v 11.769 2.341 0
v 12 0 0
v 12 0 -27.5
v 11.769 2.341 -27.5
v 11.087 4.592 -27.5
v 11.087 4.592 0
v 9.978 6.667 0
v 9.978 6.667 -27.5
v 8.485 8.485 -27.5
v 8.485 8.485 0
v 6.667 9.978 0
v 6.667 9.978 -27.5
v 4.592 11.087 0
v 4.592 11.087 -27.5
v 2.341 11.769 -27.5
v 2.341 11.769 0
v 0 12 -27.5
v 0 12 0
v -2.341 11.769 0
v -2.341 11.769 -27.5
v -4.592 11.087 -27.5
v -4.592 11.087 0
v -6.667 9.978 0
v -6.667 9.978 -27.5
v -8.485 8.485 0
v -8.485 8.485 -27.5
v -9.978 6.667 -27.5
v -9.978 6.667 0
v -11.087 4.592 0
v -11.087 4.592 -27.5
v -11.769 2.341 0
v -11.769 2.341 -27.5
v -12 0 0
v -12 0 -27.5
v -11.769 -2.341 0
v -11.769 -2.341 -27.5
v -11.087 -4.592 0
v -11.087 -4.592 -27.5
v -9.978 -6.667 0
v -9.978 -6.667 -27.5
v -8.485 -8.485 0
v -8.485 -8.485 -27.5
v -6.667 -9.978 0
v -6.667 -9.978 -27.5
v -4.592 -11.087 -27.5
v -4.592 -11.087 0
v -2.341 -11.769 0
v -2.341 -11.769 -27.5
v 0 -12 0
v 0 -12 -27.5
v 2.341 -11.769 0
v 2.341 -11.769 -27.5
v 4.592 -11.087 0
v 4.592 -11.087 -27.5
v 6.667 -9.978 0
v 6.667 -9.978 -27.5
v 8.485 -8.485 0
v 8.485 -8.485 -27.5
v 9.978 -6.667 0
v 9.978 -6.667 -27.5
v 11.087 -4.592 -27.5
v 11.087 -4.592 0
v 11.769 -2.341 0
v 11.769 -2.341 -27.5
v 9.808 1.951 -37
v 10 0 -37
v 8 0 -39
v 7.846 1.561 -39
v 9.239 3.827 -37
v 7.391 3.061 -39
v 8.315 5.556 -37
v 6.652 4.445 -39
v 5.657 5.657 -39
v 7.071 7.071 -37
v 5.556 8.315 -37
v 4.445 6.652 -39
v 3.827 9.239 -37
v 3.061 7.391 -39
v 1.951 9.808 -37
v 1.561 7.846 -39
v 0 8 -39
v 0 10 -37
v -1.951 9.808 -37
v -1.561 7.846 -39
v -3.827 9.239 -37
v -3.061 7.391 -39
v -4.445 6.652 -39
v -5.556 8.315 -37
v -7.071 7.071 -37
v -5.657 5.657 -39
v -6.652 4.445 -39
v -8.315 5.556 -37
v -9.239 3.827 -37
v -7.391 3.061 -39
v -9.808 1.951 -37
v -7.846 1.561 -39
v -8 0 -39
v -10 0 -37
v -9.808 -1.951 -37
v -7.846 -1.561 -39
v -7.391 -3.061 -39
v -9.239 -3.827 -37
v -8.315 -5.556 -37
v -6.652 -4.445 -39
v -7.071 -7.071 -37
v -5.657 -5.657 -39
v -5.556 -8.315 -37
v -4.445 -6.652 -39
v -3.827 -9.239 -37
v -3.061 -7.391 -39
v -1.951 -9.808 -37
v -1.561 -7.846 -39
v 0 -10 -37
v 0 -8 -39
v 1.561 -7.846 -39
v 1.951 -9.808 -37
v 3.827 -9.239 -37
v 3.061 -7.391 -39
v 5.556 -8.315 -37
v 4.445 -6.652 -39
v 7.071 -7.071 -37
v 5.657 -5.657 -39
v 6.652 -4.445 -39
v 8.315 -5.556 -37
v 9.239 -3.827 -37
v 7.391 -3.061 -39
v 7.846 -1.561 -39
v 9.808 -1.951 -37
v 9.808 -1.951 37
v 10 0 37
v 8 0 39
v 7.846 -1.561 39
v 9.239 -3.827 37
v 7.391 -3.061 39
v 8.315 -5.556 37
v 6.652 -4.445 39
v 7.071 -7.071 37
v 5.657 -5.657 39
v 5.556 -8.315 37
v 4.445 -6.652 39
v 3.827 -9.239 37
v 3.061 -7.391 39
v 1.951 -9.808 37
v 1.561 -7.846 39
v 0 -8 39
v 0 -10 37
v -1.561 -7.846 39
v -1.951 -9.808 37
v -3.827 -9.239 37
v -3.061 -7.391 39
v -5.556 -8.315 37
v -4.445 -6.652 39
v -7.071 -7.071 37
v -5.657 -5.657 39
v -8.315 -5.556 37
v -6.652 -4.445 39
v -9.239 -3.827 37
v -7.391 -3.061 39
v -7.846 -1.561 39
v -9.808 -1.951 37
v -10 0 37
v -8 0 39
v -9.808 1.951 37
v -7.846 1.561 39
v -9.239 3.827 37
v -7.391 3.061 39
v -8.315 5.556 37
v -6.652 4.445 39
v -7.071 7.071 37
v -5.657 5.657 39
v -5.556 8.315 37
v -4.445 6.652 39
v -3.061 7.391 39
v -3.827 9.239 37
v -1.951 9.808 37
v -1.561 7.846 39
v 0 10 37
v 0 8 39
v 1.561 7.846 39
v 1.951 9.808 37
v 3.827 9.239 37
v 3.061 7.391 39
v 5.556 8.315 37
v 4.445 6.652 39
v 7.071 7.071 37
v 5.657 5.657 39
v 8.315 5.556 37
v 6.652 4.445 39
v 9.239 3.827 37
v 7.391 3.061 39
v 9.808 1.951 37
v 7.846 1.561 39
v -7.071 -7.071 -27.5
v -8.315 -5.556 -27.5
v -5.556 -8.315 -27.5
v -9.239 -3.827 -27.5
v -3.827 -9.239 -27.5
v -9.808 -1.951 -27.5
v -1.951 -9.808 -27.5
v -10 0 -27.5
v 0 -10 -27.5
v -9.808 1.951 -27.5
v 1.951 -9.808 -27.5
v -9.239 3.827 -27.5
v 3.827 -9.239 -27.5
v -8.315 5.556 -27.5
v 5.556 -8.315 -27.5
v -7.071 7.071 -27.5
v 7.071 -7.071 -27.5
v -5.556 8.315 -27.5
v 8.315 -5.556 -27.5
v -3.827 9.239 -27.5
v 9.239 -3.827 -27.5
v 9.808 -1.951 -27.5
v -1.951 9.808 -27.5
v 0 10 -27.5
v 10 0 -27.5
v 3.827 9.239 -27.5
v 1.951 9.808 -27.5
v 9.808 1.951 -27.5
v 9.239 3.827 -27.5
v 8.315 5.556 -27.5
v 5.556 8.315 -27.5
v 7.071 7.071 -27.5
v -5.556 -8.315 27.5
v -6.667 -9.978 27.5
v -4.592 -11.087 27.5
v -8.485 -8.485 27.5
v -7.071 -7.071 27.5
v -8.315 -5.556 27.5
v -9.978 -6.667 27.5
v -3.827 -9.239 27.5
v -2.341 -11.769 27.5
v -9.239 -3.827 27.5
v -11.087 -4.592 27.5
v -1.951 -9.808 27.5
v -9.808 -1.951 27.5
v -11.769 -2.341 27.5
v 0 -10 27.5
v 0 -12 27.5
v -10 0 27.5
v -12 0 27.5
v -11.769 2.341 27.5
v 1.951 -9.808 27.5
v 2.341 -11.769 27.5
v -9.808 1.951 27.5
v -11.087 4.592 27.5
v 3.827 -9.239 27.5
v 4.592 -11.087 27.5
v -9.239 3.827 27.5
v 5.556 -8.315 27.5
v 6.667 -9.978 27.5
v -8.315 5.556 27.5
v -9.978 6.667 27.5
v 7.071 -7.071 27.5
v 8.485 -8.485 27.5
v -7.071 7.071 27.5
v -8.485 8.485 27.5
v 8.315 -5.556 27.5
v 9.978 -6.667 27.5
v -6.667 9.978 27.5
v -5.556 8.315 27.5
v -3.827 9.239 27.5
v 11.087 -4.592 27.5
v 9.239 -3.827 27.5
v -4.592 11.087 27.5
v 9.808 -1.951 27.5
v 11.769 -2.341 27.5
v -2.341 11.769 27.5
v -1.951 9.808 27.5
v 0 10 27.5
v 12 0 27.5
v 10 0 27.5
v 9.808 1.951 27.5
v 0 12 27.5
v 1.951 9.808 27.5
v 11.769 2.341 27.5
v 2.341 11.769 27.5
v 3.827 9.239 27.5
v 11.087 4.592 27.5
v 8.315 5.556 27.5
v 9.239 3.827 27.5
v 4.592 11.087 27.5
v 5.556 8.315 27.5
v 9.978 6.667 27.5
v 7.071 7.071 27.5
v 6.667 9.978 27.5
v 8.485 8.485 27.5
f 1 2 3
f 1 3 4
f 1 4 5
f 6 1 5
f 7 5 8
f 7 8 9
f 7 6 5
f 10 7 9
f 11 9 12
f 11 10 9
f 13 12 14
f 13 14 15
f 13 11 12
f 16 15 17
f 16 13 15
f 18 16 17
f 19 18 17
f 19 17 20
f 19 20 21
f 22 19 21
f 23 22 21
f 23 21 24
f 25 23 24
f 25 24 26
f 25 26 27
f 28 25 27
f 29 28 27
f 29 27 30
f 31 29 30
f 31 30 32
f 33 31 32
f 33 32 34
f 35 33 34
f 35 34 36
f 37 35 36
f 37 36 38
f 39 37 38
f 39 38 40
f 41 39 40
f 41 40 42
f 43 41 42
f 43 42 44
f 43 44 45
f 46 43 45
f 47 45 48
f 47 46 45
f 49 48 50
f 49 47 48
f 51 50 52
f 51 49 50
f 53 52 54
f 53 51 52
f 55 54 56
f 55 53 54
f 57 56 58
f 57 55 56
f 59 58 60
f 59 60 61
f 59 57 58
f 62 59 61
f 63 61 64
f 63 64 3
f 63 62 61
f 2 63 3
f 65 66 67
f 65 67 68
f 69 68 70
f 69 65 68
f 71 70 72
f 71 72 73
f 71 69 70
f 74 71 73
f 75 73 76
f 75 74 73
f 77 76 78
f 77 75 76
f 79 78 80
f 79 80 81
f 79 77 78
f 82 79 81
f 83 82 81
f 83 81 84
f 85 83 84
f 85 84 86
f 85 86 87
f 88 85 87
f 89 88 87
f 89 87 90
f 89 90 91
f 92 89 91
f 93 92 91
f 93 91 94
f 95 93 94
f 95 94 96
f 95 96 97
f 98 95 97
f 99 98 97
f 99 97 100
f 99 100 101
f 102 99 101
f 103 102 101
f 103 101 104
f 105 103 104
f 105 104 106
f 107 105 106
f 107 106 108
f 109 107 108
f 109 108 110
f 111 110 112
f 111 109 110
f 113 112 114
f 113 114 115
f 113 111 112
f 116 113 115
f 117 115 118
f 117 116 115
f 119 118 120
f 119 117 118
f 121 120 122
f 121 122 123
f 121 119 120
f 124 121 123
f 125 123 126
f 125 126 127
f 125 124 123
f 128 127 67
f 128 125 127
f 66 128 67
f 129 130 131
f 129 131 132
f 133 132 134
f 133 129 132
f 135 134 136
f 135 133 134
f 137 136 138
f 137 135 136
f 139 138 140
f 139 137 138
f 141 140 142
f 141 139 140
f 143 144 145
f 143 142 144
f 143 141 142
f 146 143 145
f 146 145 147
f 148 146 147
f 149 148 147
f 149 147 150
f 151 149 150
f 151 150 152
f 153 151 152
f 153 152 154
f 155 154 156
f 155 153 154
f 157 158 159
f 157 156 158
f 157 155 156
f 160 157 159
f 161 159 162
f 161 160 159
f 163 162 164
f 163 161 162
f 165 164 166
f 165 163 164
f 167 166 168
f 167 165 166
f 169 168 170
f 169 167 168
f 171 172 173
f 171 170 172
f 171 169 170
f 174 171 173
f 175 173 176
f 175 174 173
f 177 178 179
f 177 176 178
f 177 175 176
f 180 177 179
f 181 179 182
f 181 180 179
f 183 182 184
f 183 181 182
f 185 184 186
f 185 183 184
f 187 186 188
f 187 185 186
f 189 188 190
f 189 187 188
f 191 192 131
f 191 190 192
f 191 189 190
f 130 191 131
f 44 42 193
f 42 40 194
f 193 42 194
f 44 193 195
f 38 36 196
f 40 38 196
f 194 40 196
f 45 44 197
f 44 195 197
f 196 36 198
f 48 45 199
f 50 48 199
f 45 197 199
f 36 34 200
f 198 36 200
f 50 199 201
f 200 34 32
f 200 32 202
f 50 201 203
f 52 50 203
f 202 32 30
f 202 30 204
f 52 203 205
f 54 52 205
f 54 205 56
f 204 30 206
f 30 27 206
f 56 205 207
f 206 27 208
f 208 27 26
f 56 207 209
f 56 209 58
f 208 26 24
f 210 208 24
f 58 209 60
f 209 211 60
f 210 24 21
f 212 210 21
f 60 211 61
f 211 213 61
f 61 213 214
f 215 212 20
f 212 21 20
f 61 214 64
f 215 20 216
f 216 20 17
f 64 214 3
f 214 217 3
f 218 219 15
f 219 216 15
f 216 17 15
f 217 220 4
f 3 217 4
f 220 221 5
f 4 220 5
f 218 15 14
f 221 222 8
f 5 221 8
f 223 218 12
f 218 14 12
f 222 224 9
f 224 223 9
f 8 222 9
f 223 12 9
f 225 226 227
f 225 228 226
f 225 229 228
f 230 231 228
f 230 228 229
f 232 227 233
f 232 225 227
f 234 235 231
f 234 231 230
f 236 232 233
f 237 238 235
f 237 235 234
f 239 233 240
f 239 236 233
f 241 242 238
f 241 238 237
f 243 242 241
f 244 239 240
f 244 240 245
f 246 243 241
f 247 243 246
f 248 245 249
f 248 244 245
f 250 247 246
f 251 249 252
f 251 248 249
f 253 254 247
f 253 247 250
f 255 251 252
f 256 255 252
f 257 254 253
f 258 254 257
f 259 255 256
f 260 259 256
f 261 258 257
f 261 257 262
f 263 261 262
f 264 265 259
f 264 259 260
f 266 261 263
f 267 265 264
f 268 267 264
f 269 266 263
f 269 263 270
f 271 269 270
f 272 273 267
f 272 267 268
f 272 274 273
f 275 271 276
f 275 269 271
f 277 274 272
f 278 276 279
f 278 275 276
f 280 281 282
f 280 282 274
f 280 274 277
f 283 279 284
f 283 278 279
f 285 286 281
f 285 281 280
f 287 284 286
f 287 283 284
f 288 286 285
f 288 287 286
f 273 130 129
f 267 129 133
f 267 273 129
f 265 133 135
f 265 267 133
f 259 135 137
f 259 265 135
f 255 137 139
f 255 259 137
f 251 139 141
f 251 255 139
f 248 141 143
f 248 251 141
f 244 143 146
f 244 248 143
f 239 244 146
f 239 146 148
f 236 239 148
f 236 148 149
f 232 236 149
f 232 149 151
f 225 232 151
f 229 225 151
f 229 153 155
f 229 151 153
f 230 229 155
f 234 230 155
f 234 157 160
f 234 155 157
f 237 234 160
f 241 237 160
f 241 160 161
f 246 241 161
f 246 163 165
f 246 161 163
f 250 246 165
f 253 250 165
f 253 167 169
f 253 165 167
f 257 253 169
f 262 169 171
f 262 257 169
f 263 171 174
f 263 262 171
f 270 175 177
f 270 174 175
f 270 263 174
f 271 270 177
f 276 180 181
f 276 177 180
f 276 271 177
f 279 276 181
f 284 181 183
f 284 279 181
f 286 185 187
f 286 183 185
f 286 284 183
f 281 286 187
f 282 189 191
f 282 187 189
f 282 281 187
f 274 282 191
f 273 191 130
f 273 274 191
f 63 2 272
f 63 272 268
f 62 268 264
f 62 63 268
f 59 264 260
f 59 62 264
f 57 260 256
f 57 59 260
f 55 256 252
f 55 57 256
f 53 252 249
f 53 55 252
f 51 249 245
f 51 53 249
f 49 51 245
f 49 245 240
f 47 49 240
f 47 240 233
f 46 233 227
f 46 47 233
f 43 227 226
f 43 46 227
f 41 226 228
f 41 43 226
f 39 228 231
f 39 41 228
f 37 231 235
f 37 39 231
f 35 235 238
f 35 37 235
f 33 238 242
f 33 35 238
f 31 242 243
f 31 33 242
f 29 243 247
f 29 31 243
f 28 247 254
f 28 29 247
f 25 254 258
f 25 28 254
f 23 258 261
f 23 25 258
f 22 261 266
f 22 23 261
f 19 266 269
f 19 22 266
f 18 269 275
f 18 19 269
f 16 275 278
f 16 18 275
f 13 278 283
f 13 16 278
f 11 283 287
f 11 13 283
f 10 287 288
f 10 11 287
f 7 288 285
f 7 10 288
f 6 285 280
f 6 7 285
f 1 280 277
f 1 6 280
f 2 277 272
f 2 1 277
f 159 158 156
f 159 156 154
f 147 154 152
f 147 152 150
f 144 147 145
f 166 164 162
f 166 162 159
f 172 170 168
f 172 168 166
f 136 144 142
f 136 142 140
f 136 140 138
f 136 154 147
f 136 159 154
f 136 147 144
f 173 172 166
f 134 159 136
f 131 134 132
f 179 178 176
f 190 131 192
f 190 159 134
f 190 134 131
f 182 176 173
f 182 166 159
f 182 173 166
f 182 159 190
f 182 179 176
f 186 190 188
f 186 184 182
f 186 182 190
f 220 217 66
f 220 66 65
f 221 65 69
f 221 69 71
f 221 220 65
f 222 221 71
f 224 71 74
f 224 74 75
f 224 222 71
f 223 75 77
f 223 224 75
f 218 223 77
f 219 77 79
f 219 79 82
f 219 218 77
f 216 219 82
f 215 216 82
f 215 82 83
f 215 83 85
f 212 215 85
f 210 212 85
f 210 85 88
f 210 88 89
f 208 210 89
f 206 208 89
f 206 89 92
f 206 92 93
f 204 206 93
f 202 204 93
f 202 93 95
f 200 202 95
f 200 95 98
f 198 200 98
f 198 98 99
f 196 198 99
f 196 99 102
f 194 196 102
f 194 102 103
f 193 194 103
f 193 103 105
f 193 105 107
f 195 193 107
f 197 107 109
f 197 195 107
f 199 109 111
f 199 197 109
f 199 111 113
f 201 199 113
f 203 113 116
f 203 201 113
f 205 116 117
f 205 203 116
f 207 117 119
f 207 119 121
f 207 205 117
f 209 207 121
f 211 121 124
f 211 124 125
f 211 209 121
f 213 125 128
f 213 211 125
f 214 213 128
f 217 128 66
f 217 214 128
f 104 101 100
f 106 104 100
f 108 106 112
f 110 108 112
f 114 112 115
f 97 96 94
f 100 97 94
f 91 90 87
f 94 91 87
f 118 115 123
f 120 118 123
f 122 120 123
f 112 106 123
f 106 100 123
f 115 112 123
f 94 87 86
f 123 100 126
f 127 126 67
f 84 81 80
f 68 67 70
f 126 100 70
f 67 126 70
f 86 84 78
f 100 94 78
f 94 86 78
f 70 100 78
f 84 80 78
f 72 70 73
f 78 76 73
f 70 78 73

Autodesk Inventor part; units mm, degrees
ref_plane "YZ Plane" through (0, 0, 0) normal (1, 0, 0) x (0, 1, 0)
ref_plane "XZ Plane" through (0, 0, 0) normal (0, 1, 0) x (-1, 0, 0)
ref_plane "XY Plane" through (0, 0, 0) normal (0, 0, 1) x (1, 0, 0)
sketch "Sketch1" plane through (0, 0, 0) normal (0, 0, 1) x (1, 0, 0)
  line L0 (0, 19.2) -> (0, -14.4) projected
  line L1 (-14.4, 0) -> (19.2, 0) projected
  circle A0 centre (0, 0) radius 12
  dimension "d0" = 24
extrude "Extrusion1" add sketch "Sketch1" along normal mid plane 55
sketch "Sketch2" plane through (0, 0, 0) normal (0, 0, 1) x (1, 0, 0)
  circle A0 centre (0, 0) radius 12 projected
  circle A1 centre (0, 0) radius 12 projected
  circle A2 centre (0, 0) radius 10
  dimension "d3" = 20
extrude "Extrusion2" add sketch "Sketch2" along normal mid plane 78 contours A2
chamfer "Chamfer1" distance 2 angle 45 2 edges at (-10, 0, 39) (-10, 0, -39)
properties part number "Axle" material "Galvanized Steel"
